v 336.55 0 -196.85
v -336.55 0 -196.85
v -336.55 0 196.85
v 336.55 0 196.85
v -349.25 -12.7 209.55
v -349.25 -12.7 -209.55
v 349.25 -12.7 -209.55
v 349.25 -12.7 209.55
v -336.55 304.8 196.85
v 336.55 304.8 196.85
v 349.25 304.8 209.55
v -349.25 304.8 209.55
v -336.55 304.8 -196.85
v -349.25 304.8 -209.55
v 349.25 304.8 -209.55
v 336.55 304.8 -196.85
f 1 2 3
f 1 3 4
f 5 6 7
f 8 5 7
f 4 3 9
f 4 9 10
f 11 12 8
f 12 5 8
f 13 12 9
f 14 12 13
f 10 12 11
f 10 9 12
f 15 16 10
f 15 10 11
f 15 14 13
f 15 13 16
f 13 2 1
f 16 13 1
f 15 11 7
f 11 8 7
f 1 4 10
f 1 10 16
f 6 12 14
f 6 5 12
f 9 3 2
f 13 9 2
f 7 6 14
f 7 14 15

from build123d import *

# Parameters (mm, degrees)
SKETCH1_W           = 698.5
SKETCH1_H           = 419.1
BOSS_EXTRUDE1_DEPTH = 12.7
SKETCH1_3_W         = 698.5
SKETCH1_3_H         = 419.1
SKETCH1_3_W_2       = 673.1
SKETCH1_3_H_2       = 393.7
BOSS_EXTRUDE2_DEPTH = 304.8


with BuildPart() as part:
    # Sketch1 → Boss-Extrude1 (new body)
    with BuildSketch(Plane(origin=(0, 0, 0), x_dir=(1, 0, 0), z_dir=(0, 1, 0))):
        Rectangle(SKETCH1_W, SKETCH1_H)
    extrude(amount=-BOSS_EXTRUDE1_DEPTH)

    # Sketch1<3> → Boss-Extrude2 (add)
    with BuildSketch(Plane(origin=(0, 0, 0), x_dir=(1, 0, 0), z_dir=(0, 1, 0))):
        Rectangle(SKETCH1_3_W, SKETCH1_3_H)
        Rectangle(SKETCH1_3_W_2, SKETCH1_3_H_2, mode=Mode.SUBTRACT)
    extrude(amount=BOSS_EXTRUDE2_DEPTH)


solid = part.part
